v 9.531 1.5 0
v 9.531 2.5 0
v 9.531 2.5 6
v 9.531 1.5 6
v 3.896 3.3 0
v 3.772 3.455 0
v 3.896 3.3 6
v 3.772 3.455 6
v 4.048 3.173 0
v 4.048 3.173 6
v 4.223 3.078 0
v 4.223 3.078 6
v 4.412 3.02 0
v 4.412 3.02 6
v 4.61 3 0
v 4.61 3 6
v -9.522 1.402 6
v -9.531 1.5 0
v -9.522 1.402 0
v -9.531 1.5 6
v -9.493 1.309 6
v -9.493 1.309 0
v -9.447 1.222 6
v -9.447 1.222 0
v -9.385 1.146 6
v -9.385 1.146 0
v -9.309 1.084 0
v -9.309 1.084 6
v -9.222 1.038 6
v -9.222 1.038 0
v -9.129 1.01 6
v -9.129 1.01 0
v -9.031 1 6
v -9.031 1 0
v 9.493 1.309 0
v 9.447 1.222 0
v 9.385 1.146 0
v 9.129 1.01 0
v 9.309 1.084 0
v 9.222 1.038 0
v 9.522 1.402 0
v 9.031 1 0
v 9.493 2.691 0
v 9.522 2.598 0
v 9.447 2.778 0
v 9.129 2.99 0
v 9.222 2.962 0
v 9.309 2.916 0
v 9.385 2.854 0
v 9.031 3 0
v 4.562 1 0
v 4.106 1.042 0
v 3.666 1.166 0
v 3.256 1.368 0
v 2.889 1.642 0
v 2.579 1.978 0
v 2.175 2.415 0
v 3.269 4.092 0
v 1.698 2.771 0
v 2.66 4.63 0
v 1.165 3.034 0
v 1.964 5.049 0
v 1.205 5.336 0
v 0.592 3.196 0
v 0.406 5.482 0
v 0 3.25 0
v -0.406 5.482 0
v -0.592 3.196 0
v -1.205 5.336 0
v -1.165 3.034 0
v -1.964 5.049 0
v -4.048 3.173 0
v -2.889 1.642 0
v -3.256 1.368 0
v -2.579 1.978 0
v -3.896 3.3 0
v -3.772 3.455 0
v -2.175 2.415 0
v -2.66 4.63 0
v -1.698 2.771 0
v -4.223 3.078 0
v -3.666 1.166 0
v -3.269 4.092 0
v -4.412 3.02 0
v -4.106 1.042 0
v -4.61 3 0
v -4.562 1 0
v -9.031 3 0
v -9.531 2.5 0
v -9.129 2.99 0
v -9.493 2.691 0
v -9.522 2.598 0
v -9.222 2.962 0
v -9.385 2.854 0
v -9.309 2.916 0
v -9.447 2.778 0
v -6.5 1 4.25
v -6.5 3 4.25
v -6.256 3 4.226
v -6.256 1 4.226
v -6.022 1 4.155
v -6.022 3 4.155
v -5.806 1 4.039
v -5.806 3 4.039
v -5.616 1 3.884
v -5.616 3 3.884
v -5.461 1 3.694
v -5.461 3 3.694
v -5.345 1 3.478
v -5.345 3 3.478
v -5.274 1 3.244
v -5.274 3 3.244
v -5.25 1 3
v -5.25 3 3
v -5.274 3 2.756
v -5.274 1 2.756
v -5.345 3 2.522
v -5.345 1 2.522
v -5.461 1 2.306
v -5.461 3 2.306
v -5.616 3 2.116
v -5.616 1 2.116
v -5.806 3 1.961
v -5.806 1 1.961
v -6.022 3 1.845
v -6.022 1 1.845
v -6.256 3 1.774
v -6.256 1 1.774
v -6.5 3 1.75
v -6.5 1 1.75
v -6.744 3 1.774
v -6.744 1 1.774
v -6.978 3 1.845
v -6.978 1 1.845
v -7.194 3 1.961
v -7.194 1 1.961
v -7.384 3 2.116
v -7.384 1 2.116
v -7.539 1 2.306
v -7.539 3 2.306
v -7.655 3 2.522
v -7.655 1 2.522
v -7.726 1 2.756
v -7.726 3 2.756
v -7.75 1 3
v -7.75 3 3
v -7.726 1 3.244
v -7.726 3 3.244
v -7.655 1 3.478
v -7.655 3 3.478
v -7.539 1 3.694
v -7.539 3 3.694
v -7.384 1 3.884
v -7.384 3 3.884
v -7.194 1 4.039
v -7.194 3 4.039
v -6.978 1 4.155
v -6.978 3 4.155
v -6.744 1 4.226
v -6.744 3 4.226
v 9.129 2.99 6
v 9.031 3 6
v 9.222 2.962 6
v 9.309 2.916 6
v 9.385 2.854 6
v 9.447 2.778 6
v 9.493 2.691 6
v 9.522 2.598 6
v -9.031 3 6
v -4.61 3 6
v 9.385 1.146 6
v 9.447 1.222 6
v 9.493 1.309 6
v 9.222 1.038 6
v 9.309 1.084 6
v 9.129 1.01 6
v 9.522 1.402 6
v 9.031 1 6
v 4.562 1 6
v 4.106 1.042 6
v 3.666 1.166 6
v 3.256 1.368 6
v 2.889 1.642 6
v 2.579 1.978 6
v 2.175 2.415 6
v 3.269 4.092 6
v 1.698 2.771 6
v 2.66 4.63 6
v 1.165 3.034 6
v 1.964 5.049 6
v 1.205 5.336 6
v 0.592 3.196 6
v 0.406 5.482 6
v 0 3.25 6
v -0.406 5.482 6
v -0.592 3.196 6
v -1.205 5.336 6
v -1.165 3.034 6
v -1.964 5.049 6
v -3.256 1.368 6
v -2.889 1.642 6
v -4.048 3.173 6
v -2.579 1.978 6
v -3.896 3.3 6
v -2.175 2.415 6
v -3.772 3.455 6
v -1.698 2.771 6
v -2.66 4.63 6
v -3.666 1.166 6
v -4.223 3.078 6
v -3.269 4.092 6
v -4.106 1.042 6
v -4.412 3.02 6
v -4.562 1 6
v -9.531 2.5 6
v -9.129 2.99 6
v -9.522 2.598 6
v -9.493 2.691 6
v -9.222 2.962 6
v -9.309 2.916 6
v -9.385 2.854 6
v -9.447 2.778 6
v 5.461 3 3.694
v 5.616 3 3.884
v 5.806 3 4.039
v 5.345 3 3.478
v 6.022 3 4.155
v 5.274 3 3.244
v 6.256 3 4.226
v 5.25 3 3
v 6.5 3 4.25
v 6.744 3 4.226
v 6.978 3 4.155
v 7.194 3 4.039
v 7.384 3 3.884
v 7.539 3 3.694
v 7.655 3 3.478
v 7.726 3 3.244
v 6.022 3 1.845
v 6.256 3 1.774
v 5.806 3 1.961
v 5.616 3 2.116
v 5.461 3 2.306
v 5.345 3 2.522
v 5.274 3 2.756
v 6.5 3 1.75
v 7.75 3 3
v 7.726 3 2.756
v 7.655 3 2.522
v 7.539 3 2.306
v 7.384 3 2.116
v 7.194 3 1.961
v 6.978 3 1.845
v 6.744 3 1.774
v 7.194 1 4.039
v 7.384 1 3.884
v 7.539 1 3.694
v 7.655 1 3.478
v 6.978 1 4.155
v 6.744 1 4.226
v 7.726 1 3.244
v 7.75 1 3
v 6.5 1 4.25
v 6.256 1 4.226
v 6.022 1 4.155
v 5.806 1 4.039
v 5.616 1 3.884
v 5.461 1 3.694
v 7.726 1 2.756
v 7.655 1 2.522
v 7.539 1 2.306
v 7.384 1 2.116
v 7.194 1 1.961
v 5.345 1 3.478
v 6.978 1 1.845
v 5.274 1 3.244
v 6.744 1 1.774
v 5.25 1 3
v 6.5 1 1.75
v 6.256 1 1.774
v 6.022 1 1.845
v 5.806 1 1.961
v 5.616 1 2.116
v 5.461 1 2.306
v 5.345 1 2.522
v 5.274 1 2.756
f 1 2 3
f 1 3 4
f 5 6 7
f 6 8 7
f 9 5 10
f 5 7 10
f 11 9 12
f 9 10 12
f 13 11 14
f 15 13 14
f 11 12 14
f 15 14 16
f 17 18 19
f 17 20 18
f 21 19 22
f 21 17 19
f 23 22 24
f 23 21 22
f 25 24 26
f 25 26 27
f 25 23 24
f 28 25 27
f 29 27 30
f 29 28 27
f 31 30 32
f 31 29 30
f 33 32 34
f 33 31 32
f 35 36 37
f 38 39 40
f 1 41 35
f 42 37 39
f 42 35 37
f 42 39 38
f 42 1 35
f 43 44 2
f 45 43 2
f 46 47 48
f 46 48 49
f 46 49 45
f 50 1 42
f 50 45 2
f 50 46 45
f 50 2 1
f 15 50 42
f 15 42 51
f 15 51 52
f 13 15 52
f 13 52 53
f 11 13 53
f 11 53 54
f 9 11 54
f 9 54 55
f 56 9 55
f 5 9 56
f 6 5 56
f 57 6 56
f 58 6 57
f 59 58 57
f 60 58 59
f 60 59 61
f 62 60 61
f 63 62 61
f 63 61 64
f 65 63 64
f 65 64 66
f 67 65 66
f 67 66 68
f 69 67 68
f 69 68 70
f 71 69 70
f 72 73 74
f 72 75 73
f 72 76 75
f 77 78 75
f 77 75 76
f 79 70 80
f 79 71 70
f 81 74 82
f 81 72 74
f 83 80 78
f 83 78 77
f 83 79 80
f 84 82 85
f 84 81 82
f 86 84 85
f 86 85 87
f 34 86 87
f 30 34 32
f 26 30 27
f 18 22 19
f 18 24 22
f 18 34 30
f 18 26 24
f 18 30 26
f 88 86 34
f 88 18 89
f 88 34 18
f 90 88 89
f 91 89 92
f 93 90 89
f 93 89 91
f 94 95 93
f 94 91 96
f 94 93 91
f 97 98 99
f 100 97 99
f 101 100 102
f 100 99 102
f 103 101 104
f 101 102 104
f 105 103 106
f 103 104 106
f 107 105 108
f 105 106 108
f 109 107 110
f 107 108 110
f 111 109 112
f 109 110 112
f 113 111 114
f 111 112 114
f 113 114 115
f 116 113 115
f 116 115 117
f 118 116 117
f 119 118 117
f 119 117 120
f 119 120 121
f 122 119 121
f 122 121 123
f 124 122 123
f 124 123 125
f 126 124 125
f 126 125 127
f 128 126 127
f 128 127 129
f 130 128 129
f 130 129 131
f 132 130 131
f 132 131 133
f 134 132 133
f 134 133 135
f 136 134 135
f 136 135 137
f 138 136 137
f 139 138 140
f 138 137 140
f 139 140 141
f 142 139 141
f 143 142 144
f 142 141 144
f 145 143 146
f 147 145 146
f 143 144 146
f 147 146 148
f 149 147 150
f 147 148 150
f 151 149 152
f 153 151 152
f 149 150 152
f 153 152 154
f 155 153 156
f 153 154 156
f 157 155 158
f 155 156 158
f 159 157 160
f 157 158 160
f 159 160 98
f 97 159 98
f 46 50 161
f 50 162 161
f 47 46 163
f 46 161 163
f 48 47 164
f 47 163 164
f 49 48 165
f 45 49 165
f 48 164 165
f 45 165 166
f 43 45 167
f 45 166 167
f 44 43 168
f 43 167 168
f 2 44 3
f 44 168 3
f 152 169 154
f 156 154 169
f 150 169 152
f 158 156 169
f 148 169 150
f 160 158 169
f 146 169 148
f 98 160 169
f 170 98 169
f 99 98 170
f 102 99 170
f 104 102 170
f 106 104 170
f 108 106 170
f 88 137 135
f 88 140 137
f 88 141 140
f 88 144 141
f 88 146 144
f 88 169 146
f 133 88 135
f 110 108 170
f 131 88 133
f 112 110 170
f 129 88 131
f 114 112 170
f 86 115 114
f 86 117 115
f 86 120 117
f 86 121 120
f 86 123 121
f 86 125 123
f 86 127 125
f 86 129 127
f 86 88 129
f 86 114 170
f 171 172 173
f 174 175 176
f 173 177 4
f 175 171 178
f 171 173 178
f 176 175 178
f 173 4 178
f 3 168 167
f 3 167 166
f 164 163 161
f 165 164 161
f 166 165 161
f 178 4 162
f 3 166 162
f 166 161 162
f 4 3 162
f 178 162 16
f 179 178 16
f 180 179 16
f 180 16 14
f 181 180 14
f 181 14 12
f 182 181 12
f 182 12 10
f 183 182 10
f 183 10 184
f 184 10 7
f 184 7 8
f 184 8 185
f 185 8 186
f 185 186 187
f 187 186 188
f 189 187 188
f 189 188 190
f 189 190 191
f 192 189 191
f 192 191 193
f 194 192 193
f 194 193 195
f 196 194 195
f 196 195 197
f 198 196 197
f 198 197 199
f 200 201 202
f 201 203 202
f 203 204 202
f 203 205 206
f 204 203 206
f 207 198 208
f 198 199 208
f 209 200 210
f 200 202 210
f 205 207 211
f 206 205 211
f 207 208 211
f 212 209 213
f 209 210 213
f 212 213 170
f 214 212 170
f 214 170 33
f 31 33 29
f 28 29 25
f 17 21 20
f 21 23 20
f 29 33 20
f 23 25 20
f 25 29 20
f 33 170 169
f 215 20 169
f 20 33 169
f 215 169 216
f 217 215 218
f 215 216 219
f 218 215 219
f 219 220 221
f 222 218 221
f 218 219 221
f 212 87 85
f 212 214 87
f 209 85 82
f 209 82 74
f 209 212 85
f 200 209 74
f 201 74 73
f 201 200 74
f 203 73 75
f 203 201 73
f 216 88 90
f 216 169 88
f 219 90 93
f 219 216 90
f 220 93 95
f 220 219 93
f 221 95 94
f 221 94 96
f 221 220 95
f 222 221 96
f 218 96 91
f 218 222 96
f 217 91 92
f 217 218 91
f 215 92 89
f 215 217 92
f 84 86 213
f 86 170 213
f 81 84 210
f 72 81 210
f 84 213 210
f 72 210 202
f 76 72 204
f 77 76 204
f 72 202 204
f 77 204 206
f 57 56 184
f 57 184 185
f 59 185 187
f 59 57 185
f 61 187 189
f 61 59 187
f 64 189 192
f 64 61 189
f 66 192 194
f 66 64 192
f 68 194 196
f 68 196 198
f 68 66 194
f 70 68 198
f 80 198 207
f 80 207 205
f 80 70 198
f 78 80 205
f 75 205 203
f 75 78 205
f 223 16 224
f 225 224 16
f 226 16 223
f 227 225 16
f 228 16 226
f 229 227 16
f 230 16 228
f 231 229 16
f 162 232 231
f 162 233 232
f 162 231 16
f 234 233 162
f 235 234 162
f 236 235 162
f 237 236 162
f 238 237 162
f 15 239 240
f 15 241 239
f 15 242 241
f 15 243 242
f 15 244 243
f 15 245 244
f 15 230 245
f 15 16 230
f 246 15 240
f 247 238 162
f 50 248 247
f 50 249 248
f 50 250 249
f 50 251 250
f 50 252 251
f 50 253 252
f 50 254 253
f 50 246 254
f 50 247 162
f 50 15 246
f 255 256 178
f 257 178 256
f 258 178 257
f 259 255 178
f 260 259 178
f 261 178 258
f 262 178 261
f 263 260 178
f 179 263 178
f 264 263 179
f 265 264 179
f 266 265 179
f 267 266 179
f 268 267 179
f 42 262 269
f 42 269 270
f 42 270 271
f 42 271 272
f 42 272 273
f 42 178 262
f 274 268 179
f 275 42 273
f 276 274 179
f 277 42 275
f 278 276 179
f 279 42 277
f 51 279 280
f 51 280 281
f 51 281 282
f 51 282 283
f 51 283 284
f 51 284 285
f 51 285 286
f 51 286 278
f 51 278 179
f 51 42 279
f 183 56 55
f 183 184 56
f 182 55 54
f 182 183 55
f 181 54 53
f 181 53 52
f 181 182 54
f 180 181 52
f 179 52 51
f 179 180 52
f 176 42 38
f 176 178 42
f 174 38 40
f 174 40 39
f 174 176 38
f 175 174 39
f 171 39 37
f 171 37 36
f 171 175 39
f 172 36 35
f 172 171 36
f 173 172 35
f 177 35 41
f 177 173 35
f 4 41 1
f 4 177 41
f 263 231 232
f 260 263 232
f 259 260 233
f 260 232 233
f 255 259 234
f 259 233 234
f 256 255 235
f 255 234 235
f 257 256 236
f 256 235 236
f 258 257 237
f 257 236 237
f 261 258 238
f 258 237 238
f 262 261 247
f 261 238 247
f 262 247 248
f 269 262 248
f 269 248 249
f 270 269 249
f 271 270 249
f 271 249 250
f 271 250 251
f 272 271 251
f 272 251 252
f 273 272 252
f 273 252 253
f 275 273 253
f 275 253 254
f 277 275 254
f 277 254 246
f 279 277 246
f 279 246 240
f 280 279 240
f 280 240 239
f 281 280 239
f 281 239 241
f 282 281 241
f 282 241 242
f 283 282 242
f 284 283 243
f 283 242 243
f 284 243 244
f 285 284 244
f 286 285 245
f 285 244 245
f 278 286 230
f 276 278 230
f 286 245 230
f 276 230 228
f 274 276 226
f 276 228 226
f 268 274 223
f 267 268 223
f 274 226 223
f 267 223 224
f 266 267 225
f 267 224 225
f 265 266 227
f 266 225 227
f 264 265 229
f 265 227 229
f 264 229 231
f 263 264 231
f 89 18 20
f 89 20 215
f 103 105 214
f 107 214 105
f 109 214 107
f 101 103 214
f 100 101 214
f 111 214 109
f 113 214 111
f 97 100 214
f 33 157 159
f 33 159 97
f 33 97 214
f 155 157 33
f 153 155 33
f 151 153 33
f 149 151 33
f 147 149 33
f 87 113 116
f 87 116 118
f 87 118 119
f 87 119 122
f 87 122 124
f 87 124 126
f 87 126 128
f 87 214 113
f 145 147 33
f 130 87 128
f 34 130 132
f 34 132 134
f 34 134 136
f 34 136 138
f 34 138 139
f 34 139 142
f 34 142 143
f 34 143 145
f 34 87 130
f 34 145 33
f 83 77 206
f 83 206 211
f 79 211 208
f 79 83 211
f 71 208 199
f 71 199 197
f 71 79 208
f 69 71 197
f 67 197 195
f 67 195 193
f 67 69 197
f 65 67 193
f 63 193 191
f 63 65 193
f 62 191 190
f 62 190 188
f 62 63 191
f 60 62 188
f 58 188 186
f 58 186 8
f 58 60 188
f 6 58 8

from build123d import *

# Parameters (mm, degrees)
BOSS_EXTRUDE1_DEPTH = 6
SKETCH2_R           = 1.25
CUT_EXTRUDE1_DEPTH  = 10
FILLET1_R           = 1
FILLET2_R           = 0.5
FILLET3_R           = 2.5


with BuildPart() as part:
    # Sketch1 → Boss-Extrude1 (new body)
    with BuildSketch(Plane.XY):
        with BuildLine():
            Line((-3.092329219, 1), (-9.531128874, 1))
            Line((-9.531128874, 1), (-9.531128874, 3))
            Line((-9.531128874, 3), (-4.031128874, 3))
            ThreePointArc((-4.031128874, 3), (0, 5.5), (4.031128874, 3))
            Line((4.031128874, 3), (9.531128874, 3))
            Line((9.531128874, 3), (9.531128874, 1))
            Line((9.531128874, 1), (3.092329219, 1))
            ThreePointArc((3.092329219, 1), (0, 3.25), (-3.092329219, 1))
        make_face()
    extrude(amount=BOSS_EXTRUDE1_DEPTH)

    # Sketch2 → Cut-Extrude1 (cut)
    with BuildSketch(Plane(origin=(0, 3, 0), x_dir=(1, 0, 0), z_dir=(0, 1, 0))):
        with Locations(Location((-6.5, -3, 0), (0, 0, 270))):
            Circle(SKETCH2_R)
        with Locations(Location((6.5, -3, 0), (0, 0, 270))):
            Circle(SKETCH2_R)
    extrude(amount=-CUT_EXTRUDE1_DEPTH, mode=Mode.SUBTRACT)

    # Fillet1
    fillet1_edges = [part.edges().sort_by_distance(p)[0] for p in [
        (-4.031128874, 3, 3),
        (4.031128874, 3, 3),
    ]]
    fillet(fillet1_edges, radius=FILLET1_R)

    # Fillet2
    fillet2_edges = [part.edges().sort_by_distance(p)[0] for p in [
        (-9.531128874, 1, 3),
        (-9.531128874, 3, 3),
        (9.531128874, 3, 3),
        (9.531128874, 1, 3),
    ]]
    fillet(fillet2_edges, radius=FILLET2_R)

    # Fillet3
    fillet3_edges = [part.edges().sort_by_distance(p)[0] for p in [
        (-3.092329219, 1, 3),
        (3.092329219, 1, 3),
    ]]
    fillet(fillet3_edges, radius=FILLET3_R)


solid = part.part
